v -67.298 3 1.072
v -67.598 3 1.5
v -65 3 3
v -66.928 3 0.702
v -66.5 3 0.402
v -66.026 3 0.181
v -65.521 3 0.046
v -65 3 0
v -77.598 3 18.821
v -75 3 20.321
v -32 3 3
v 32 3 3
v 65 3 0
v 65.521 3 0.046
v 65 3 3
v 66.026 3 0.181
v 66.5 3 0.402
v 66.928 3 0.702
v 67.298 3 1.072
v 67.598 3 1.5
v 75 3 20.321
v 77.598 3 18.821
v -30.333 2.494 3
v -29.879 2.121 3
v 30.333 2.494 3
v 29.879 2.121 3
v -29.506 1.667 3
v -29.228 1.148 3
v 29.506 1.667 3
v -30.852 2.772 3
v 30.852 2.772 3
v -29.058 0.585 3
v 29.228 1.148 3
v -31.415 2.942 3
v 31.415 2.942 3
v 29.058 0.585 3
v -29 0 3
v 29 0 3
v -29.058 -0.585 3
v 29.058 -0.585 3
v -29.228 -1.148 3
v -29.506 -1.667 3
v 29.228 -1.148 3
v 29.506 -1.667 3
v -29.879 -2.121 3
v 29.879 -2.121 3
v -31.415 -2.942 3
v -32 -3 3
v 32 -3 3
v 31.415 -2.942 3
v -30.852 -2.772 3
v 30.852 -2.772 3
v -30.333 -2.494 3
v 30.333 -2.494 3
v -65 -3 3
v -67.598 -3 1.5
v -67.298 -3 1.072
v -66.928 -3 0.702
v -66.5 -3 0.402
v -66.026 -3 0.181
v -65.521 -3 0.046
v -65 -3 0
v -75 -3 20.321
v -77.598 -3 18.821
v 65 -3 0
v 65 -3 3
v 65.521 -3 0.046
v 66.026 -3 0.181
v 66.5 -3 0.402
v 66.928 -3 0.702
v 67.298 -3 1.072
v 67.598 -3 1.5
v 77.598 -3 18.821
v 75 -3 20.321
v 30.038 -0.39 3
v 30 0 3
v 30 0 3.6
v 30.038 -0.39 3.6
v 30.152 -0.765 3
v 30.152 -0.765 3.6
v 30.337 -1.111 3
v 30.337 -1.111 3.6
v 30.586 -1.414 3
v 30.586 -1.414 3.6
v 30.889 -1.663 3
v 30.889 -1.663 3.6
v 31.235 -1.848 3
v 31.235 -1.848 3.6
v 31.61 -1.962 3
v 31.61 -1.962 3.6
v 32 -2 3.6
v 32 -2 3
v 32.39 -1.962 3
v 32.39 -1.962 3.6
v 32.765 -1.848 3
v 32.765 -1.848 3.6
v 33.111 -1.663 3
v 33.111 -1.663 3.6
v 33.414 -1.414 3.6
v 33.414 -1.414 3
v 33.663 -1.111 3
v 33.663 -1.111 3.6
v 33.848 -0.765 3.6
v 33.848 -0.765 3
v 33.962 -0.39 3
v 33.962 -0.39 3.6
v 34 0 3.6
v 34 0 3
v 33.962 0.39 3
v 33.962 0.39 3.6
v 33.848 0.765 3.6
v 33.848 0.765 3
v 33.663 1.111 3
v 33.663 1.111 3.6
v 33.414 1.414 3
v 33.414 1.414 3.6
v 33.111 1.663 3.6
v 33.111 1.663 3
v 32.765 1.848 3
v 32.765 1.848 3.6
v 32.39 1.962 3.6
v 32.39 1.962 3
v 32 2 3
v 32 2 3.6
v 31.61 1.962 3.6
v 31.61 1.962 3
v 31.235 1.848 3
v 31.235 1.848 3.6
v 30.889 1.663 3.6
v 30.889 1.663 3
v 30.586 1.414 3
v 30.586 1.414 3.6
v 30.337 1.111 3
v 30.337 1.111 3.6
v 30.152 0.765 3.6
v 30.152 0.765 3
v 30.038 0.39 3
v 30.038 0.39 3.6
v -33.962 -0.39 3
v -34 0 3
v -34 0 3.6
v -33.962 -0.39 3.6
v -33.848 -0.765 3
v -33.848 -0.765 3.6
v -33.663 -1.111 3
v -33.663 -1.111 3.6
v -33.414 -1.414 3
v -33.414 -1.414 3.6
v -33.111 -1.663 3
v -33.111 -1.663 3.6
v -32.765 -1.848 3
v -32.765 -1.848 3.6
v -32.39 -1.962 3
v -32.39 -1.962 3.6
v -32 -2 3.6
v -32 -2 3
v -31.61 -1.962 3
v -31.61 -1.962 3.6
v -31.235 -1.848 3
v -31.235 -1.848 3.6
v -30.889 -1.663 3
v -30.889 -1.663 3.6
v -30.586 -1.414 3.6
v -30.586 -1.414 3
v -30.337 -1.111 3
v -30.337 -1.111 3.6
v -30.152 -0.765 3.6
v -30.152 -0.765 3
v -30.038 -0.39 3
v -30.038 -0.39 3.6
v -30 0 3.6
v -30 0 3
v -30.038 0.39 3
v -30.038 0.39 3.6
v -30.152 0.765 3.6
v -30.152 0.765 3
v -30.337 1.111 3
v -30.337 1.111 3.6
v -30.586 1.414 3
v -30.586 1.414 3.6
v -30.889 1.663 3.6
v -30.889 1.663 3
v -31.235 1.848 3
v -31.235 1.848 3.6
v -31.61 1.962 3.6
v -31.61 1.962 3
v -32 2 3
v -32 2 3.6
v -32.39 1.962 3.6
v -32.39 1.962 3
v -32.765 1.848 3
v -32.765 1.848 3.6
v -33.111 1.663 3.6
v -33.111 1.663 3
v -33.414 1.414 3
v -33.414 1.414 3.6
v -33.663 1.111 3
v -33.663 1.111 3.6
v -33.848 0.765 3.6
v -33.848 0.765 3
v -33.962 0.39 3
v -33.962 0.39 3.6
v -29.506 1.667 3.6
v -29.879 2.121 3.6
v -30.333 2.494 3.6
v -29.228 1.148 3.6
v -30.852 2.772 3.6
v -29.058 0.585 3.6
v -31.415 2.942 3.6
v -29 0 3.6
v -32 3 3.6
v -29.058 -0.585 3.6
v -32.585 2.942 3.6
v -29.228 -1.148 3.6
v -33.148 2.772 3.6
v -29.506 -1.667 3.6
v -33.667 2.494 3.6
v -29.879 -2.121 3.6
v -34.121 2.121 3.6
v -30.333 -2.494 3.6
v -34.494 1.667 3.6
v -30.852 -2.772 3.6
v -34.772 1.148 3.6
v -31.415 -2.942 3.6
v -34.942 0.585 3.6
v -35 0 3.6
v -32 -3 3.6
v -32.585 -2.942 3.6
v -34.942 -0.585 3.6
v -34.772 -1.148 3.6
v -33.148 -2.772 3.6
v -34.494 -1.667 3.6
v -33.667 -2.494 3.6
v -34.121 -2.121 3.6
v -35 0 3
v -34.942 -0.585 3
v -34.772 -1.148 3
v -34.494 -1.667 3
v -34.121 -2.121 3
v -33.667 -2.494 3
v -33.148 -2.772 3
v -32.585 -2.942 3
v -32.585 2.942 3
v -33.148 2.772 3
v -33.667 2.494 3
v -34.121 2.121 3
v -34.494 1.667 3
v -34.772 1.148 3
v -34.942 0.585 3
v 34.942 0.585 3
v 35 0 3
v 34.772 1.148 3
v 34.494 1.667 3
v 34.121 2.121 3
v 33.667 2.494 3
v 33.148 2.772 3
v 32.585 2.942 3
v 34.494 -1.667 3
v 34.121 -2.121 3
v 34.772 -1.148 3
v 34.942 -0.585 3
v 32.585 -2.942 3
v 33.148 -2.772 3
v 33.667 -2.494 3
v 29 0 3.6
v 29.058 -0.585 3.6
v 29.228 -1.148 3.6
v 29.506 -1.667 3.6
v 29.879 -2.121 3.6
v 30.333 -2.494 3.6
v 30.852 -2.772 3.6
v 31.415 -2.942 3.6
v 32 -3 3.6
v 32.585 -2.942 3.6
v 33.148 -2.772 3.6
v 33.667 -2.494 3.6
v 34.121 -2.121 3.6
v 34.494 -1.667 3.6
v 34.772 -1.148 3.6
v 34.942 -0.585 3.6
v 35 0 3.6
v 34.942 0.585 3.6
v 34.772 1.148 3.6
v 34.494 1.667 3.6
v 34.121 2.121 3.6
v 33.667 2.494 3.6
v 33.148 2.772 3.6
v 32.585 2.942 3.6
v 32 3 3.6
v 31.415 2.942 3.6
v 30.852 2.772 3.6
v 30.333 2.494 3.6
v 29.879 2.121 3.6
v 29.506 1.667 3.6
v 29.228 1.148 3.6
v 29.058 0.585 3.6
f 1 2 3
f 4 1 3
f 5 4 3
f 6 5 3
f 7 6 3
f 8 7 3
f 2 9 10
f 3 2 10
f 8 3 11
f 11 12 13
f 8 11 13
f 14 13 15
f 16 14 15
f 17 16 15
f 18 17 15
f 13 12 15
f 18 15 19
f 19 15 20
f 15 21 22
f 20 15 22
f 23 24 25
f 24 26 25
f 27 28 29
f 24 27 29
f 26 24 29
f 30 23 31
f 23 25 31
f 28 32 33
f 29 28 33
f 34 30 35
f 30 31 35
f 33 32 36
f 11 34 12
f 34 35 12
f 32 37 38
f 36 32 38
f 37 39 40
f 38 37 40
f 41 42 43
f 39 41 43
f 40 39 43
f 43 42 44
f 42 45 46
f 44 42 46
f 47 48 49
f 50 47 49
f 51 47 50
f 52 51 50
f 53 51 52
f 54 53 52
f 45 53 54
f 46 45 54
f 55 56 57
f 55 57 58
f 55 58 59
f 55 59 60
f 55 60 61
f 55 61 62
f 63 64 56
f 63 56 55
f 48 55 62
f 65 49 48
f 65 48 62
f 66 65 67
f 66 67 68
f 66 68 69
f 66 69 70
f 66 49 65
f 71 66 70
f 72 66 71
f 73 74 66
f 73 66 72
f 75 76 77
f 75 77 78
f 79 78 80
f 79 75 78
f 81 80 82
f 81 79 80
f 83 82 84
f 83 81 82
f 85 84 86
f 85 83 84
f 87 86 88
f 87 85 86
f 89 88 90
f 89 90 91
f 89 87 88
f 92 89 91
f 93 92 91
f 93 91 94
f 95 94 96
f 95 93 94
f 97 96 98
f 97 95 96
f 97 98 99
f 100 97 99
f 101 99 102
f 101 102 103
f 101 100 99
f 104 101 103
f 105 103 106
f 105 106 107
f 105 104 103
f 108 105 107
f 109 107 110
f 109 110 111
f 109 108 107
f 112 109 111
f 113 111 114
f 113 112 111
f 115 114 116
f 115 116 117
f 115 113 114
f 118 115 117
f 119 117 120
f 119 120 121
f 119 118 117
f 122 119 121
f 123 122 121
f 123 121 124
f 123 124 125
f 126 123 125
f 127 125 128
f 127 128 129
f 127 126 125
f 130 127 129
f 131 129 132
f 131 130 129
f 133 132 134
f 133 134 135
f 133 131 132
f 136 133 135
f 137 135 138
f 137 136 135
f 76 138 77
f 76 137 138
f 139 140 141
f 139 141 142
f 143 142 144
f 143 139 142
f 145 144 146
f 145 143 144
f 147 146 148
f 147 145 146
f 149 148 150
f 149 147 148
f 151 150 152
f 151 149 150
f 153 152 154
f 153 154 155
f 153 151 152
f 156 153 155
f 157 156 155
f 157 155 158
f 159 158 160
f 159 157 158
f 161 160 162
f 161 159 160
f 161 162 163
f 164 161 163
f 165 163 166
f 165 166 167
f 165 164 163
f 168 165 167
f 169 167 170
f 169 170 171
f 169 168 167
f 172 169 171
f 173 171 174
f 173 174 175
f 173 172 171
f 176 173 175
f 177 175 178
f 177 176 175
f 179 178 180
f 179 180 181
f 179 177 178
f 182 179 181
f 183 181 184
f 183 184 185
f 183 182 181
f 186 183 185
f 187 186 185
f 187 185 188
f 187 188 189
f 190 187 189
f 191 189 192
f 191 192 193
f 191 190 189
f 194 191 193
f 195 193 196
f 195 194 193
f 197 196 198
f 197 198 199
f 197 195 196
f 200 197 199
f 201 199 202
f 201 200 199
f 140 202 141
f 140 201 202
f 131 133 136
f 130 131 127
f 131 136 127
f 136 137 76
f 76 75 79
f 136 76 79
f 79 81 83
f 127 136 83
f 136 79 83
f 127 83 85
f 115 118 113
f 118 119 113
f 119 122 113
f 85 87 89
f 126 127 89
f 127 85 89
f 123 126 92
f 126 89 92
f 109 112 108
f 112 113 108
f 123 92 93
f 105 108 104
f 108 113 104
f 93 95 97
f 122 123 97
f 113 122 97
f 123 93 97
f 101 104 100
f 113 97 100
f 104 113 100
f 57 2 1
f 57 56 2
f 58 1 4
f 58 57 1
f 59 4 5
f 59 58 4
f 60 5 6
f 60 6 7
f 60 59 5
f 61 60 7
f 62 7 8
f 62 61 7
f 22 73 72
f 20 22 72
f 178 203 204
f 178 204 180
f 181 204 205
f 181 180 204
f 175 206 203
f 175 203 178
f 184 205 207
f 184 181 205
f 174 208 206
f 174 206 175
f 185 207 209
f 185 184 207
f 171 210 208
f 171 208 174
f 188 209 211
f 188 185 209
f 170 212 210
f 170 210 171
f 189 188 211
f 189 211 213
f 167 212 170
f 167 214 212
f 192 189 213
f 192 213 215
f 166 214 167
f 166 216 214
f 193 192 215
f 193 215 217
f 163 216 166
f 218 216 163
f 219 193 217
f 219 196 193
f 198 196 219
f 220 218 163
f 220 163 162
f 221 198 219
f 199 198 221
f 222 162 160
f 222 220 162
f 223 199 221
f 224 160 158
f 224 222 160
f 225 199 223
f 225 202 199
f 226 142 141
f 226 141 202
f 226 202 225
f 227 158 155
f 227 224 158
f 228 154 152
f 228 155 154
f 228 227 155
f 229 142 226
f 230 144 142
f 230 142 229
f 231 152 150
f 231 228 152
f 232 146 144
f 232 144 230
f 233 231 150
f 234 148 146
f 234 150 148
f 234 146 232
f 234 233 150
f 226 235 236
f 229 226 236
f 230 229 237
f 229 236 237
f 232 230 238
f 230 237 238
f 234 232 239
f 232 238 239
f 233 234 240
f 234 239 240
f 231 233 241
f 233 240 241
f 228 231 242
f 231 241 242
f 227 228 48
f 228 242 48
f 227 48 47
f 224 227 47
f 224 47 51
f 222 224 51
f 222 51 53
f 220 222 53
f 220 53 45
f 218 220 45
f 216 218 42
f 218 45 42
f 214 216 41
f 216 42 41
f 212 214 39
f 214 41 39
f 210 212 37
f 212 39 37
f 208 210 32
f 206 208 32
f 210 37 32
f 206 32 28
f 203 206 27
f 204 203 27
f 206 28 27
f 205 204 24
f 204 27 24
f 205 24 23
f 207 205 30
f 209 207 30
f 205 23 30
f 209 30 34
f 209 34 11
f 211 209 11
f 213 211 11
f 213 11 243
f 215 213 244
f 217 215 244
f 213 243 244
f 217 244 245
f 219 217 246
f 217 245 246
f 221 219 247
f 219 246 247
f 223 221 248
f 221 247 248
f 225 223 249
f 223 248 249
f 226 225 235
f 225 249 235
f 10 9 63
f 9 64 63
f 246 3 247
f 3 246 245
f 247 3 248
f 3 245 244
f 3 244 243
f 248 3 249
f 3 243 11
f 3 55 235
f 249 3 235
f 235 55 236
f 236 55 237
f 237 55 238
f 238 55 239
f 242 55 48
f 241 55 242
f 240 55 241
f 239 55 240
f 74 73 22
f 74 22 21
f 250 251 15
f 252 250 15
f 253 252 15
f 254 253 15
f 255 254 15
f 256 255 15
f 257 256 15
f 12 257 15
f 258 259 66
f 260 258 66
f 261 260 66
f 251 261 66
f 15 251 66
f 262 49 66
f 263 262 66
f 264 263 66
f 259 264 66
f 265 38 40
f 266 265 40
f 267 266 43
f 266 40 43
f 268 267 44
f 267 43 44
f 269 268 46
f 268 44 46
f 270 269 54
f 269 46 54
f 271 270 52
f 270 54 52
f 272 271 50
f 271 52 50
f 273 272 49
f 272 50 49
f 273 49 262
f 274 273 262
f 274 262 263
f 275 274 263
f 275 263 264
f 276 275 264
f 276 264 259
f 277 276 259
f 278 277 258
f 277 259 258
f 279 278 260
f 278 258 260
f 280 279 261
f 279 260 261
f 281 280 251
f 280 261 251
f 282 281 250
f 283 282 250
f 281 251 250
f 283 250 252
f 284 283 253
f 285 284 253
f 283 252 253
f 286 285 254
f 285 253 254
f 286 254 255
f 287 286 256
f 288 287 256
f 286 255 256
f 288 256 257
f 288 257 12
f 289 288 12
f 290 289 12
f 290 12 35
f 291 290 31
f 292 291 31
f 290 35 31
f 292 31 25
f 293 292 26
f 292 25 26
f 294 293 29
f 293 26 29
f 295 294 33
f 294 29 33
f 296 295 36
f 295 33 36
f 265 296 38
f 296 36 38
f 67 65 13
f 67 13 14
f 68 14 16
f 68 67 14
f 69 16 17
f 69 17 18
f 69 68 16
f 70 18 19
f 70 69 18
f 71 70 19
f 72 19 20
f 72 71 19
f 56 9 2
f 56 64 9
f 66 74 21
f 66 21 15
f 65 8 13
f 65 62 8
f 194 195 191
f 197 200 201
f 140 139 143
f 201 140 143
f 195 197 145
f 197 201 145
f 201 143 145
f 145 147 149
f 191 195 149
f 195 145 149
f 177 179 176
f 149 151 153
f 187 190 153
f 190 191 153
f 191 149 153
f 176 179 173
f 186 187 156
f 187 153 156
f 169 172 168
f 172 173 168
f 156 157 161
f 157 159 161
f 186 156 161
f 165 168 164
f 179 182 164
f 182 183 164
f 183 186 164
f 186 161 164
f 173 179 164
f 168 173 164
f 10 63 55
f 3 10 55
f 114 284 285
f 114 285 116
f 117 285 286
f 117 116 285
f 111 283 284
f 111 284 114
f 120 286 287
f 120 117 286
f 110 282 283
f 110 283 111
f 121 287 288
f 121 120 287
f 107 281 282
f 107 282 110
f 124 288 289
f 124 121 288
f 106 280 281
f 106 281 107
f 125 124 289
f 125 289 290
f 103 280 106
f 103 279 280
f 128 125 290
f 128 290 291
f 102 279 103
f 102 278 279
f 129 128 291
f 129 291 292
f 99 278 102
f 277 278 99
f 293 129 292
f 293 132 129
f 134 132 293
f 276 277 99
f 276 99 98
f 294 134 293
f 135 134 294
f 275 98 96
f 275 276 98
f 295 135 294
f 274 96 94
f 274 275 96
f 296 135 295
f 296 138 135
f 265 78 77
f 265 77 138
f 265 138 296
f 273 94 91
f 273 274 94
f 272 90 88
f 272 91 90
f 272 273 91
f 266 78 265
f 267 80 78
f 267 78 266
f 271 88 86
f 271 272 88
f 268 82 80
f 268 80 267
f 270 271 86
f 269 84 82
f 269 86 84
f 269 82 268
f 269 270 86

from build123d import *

# Parameters (mm, degrees)
PAD_DEPTH     = 3
SKETCH001_R   = 3
SKETCH001_R_2 = 2
PAD001_DEPTH  = 0.6


with BuildPart() as part:
    # Sketch → Pad (new body, symmetric)
    with BuildSketch(Plane.XZ):
        with BuildLine():
            Line((-65, 0), (65, 0))
            ThreePointArc((65, 0), (66.499997, 0.401922), (67.598072, 1.499993))
            Line((77.598076, 18.820508), (67.598072, 1.499993))
            Line((77.598076, 18.820508), (75, 20.320508))
            Line((75, 20.320508), (65, 3))
            Line((-65, 3), (65, 3))
            Line((-75, 20.320508), (-65, 3))
            Line((-77.598076, 18.820508), (-75, 20.320508))
            Line((-77.598076, 18.820508), (-67.598088, 1.50002))
            ThreePointArc((-67.598088, 1.50002), (-66.50001, 0.40193), (-65, 0))
        make_face()
    extrude(amount=PAD_DEPTH, both=True)

    # Sketch001 → Pad001 (new body)
    with BuildSketch(Plane(origin=(0, 0, 3), x_dir=(-1, 0, 0), z_dir=(0, 0, 1))):
        with Locations((-32, 0)):
            Circle(SKETCH001_R)
        with Locations((-32, 0)):
            Circle(SKETCH001_R_2, mode=Mode.SUBTRACT)
        with Locations((32, 0)):
            Circle(SKETCH001_R)
        with Locations((32, 0)):
            Circle(SKETCH001_R_2, mode=Mode.SUBTRACT)
    extrude(amount=PAD001_DEPTH)


solid = part.part
